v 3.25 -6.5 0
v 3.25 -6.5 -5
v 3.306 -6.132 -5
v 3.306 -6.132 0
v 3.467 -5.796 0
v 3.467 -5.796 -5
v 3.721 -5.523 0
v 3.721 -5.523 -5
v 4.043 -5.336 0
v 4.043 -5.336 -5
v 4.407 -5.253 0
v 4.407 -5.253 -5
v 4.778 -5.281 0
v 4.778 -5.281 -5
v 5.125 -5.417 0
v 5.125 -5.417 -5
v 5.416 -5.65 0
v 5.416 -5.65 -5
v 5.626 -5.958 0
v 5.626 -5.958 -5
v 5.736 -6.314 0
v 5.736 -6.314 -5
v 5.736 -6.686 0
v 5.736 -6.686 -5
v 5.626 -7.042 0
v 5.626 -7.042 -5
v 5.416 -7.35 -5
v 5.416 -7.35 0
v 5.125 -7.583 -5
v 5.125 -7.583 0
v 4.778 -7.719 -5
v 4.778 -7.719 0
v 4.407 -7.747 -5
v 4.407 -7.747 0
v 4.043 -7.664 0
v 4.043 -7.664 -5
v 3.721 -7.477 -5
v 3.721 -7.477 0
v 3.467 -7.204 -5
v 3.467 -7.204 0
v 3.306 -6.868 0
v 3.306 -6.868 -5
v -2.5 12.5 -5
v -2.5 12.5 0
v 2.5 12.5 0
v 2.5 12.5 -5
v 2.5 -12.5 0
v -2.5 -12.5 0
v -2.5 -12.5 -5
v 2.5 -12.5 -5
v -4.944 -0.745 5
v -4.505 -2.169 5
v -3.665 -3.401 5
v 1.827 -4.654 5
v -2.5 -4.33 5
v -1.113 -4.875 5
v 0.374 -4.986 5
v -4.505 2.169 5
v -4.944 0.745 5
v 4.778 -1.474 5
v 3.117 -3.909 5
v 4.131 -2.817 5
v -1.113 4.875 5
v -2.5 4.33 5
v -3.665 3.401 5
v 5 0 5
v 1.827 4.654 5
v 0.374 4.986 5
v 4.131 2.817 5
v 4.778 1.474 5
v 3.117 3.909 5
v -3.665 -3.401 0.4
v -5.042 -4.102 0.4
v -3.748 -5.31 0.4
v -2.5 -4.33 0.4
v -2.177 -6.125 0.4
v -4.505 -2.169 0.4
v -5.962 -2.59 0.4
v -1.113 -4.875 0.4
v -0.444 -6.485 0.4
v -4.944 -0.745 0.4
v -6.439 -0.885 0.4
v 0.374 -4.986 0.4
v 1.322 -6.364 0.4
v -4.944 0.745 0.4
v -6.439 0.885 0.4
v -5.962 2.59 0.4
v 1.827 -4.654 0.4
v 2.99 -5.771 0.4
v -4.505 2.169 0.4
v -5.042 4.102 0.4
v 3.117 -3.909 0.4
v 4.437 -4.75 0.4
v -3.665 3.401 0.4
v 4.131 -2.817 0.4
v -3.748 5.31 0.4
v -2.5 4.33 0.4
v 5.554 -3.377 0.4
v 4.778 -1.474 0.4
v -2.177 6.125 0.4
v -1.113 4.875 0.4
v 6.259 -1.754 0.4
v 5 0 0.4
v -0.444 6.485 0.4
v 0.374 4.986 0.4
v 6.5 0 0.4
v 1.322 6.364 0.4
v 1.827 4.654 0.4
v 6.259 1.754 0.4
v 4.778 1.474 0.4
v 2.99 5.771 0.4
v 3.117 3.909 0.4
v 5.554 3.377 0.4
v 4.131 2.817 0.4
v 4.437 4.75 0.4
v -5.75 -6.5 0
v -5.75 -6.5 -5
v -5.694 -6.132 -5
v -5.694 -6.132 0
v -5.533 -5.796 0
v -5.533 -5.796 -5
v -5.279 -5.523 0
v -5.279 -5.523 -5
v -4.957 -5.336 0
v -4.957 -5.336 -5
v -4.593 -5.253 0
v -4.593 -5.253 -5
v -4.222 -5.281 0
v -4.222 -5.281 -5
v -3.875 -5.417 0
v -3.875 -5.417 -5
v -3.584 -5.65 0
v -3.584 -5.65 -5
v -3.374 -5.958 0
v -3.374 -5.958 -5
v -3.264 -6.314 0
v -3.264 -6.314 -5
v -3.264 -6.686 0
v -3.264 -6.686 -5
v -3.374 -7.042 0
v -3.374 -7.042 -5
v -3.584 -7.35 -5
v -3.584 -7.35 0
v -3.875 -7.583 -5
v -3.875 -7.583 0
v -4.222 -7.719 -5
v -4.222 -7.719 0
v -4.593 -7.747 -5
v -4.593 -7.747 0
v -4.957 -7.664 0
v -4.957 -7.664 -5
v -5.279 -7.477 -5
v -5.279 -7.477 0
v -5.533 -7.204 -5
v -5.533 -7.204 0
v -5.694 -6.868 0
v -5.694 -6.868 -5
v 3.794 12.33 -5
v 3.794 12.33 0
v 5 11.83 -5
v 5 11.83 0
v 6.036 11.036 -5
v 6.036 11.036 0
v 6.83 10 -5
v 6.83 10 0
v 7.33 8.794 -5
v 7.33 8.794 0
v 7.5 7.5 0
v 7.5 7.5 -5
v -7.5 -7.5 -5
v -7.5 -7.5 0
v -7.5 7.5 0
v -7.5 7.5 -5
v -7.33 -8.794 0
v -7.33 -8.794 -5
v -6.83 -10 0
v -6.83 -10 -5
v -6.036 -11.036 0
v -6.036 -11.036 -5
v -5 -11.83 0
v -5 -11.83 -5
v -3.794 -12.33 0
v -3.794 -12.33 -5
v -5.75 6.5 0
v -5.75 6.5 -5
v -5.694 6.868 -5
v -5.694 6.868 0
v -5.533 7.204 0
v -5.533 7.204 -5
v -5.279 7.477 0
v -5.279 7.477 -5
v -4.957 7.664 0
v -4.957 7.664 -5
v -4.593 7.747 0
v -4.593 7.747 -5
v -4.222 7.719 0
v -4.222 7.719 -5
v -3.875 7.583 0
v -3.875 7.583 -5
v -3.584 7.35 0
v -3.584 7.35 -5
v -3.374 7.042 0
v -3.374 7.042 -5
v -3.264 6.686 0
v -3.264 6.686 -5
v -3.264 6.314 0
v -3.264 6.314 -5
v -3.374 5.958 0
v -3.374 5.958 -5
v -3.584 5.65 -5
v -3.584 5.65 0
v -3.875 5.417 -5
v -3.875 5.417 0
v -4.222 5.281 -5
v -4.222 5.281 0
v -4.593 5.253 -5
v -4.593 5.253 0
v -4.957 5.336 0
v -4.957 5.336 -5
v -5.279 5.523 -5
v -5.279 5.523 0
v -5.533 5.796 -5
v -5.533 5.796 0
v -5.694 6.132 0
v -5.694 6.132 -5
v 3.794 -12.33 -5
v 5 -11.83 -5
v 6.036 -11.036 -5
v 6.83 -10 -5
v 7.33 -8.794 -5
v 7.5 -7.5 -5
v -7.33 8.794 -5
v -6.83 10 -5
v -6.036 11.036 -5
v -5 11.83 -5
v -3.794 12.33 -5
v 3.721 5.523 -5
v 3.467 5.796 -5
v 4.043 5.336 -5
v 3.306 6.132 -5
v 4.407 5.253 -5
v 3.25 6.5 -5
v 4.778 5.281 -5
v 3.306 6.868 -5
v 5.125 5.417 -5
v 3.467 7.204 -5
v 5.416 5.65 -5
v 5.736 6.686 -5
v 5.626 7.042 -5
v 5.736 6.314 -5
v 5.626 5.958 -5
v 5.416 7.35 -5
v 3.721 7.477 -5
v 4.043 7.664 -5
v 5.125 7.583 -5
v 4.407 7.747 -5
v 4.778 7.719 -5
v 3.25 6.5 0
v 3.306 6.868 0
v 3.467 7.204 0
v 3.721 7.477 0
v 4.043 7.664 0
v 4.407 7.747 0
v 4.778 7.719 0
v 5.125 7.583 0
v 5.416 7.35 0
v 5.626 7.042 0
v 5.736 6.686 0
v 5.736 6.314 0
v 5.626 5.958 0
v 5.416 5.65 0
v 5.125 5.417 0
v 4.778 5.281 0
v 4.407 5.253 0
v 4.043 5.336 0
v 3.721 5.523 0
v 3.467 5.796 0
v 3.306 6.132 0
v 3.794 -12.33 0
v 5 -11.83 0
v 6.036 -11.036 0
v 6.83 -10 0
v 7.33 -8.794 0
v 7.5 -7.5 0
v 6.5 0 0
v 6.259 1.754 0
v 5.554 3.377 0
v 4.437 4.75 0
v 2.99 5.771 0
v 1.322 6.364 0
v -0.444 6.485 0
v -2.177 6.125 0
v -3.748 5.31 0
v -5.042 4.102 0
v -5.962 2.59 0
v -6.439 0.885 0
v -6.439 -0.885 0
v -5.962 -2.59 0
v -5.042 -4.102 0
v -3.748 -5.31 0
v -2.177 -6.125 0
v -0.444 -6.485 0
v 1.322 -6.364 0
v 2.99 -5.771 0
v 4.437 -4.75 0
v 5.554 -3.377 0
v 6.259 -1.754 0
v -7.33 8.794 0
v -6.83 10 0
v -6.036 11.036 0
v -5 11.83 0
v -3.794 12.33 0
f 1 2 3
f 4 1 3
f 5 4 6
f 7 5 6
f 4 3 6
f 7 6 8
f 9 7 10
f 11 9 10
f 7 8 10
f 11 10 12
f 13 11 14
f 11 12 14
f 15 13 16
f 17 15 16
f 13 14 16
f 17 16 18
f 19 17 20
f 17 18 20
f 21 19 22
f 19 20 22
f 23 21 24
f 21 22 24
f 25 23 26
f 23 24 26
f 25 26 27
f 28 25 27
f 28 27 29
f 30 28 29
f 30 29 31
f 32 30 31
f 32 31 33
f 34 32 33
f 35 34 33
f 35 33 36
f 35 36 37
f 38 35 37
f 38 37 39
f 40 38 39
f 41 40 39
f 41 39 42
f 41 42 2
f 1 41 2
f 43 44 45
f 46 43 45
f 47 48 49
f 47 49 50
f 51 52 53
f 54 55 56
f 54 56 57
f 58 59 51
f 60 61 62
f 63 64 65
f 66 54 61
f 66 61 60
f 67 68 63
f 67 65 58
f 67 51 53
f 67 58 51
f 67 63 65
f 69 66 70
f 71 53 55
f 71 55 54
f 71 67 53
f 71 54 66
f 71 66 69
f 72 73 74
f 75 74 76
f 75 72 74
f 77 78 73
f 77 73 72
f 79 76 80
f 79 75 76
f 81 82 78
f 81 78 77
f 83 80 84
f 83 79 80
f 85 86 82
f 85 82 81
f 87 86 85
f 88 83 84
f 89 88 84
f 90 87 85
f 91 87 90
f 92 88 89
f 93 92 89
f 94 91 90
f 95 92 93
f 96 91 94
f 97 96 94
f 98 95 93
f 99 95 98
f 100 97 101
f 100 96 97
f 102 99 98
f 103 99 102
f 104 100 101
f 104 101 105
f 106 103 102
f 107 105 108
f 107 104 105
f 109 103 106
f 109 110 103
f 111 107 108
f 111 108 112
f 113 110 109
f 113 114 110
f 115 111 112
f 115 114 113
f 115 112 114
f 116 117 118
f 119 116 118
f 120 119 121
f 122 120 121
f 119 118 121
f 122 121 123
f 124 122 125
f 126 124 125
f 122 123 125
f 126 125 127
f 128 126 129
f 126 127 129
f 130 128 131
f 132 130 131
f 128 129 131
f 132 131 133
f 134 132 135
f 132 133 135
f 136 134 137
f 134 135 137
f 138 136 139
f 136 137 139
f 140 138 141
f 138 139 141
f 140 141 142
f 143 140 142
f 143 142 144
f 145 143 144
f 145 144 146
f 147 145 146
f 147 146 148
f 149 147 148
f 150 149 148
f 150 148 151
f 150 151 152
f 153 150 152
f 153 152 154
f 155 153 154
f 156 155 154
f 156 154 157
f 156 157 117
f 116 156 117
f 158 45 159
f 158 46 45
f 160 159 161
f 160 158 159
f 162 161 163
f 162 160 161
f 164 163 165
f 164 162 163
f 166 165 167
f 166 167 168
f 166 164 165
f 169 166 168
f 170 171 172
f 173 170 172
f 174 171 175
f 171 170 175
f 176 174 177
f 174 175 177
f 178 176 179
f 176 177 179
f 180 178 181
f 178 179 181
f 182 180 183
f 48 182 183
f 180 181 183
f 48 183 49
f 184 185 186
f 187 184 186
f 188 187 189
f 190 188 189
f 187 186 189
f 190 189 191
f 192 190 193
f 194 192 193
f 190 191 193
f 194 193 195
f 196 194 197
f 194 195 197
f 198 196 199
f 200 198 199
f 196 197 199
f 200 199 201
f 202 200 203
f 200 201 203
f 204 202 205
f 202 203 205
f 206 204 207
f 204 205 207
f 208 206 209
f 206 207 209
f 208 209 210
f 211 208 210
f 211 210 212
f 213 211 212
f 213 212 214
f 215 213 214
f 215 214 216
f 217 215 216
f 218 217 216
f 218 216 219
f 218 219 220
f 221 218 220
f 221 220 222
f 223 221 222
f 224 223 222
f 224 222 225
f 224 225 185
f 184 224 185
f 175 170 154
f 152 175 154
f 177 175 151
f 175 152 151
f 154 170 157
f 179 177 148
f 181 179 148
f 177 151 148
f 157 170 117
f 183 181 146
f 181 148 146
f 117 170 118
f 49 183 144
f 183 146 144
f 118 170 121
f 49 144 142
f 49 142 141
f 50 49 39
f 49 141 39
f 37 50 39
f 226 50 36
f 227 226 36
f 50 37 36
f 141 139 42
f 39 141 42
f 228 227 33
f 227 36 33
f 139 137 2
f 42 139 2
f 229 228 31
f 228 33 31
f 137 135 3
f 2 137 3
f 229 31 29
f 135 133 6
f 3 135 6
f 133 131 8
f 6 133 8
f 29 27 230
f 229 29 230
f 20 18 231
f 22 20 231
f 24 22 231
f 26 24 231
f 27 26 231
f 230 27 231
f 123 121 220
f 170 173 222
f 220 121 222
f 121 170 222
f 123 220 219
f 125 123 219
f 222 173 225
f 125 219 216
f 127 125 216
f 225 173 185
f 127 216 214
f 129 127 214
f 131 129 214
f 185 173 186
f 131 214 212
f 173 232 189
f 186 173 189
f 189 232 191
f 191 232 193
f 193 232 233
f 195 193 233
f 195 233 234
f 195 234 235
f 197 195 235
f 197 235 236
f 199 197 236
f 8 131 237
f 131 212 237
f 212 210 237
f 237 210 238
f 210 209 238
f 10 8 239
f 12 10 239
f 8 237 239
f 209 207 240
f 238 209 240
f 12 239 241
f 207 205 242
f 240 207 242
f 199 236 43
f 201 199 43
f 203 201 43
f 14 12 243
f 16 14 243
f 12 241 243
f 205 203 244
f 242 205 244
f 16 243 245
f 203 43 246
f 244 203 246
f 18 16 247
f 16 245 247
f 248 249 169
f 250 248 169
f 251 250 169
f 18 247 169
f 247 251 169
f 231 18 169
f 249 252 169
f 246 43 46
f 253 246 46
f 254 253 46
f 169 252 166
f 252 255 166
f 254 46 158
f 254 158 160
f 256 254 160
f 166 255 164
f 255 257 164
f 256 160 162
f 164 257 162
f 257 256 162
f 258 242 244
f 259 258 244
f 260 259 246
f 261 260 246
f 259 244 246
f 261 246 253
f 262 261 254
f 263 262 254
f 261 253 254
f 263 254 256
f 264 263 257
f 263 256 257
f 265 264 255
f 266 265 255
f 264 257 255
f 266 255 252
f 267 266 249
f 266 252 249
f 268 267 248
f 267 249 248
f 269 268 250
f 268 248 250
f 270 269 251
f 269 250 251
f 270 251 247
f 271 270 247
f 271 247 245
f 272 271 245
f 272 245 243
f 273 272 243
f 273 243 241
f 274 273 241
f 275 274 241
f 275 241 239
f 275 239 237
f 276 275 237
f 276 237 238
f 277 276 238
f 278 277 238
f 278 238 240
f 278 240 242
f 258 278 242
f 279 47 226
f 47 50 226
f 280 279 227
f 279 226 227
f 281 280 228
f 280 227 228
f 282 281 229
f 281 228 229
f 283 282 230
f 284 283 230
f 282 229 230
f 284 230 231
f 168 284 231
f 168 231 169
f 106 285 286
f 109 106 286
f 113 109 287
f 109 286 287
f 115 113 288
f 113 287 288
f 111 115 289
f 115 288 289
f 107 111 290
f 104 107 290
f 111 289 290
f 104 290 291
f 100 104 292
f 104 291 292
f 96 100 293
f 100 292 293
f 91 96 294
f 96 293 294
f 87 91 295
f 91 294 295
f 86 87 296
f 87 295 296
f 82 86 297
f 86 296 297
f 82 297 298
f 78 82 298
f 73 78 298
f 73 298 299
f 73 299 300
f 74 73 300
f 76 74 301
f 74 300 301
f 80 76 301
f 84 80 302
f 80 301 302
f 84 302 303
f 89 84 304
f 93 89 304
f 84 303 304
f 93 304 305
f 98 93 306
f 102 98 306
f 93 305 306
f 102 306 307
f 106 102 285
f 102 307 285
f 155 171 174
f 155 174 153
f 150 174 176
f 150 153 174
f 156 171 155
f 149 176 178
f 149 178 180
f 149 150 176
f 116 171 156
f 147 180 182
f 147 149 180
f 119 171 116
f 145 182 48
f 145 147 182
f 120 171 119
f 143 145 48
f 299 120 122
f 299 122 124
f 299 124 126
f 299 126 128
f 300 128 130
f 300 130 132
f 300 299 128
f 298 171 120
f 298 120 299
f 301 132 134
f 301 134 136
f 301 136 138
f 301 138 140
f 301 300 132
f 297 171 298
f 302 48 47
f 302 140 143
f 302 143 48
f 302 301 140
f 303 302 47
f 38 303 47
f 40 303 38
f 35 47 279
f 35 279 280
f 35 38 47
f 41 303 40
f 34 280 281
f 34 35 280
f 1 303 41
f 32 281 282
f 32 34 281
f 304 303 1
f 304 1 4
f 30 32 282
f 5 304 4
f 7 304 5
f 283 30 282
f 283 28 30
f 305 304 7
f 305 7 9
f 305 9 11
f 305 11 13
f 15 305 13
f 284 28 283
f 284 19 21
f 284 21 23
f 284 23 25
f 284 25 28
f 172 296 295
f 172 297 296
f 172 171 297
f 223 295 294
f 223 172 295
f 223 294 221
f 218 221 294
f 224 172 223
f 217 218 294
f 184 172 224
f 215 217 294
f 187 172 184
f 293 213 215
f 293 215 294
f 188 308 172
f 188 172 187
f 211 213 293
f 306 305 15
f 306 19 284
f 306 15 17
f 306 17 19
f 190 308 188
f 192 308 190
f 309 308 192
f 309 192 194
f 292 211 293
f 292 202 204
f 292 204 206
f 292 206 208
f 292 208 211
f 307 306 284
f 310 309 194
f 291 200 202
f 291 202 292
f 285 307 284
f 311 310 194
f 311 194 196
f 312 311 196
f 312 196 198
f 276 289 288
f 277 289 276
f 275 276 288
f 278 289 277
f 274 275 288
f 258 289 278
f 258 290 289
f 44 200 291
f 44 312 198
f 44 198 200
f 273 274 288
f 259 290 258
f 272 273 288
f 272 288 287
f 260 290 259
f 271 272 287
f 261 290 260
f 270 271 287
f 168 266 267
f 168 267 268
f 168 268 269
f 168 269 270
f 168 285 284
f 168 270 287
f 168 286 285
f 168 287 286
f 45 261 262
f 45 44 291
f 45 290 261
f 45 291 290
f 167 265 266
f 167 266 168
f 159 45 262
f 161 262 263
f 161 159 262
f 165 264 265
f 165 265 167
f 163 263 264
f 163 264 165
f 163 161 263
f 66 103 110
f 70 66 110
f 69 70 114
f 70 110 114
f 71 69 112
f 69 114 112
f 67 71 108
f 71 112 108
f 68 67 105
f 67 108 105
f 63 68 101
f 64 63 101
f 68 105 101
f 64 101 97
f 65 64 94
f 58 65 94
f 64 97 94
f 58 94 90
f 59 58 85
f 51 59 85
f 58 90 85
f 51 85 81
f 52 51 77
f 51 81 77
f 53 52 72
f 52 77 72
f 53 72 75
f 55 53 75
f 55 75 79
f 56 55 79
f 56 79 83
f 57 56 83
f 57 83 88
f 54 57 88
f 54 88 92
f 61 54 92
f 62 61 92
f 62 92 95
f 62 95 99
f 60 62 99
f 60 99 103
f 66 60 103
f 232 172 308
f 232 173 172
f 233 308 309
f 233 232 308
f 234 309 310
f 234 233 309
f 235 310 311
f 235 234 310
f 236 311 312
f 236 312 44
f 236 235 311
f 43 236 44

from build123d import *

# Parameters (mm, degrees)
SKETCH_1_W      = 15
SKETCH_1_H      = 25
EXTRUDE_1_DEPTH = 5
SKETCH_1_3_R    = 6.5
EXTRUDE_2_DEPTH = 0.4
SKETCH_1_4_R    = 5
EXTRUDE_3_DEPTH = 5
M3X0_5_1_D      = 2.5
FILLET_1_R      = 5


with BuildPart() as part:
    # ｽｹｯﾁ1 → ﾎﾞｽ - 押し出し1 (new body)
    with BuildSketch(Plane.XY):
        Rectangle(SKETCH_1_W, SKETCH_1_H)
    extrude(amount=-EXTRUDE_1_DEPTH)

    # ｽｹｯﾁ1<3> → ﾎﾞｽ - 押し出し2 (add)
    with BuildSketch(Plane.XY):
        Circle(SKETCH_1_3_R)
    extrude(amount=EXTRUDE_2_DEPTH)

    # ｽｹｯﾁ1<4> → ﾎﾞｽ - 押し出し3 (add)
    with BuildSketch(Plane.XY):
        Circle(SKETCH_1_4_R)
    extrude(amount=EXTRUDE_3_DEPTH)

    # M3x0.5 ねじ穴用ねじ下穴ﾄﾞﾘﾙ1 (through all)
    with Locations(Plane(origin=(-4.5, 6.5, 0), x_dir=(1, 0, 0), z_dir=(0, 0, 1))):
        with Locations((0, 0), (9, 0), (9, -13), (0, -13)):
            Hole(M3X0_5_1_D / 2)

    # ﾌｨﾚｯﾄ1
    fillet_1_edges = [part.edges().sort_by_distance(p)[0] for p in [
        (-7.5, 12.5, -2.5),
        (7.5, 12.5, -2.5),
        (7.5, -12.5, -2.5),
        (-7.5, -12.5, -2.5),
    ]]
    fillet(fillet_1_edges, radius=FILLET_1_R)


solid = part.part
